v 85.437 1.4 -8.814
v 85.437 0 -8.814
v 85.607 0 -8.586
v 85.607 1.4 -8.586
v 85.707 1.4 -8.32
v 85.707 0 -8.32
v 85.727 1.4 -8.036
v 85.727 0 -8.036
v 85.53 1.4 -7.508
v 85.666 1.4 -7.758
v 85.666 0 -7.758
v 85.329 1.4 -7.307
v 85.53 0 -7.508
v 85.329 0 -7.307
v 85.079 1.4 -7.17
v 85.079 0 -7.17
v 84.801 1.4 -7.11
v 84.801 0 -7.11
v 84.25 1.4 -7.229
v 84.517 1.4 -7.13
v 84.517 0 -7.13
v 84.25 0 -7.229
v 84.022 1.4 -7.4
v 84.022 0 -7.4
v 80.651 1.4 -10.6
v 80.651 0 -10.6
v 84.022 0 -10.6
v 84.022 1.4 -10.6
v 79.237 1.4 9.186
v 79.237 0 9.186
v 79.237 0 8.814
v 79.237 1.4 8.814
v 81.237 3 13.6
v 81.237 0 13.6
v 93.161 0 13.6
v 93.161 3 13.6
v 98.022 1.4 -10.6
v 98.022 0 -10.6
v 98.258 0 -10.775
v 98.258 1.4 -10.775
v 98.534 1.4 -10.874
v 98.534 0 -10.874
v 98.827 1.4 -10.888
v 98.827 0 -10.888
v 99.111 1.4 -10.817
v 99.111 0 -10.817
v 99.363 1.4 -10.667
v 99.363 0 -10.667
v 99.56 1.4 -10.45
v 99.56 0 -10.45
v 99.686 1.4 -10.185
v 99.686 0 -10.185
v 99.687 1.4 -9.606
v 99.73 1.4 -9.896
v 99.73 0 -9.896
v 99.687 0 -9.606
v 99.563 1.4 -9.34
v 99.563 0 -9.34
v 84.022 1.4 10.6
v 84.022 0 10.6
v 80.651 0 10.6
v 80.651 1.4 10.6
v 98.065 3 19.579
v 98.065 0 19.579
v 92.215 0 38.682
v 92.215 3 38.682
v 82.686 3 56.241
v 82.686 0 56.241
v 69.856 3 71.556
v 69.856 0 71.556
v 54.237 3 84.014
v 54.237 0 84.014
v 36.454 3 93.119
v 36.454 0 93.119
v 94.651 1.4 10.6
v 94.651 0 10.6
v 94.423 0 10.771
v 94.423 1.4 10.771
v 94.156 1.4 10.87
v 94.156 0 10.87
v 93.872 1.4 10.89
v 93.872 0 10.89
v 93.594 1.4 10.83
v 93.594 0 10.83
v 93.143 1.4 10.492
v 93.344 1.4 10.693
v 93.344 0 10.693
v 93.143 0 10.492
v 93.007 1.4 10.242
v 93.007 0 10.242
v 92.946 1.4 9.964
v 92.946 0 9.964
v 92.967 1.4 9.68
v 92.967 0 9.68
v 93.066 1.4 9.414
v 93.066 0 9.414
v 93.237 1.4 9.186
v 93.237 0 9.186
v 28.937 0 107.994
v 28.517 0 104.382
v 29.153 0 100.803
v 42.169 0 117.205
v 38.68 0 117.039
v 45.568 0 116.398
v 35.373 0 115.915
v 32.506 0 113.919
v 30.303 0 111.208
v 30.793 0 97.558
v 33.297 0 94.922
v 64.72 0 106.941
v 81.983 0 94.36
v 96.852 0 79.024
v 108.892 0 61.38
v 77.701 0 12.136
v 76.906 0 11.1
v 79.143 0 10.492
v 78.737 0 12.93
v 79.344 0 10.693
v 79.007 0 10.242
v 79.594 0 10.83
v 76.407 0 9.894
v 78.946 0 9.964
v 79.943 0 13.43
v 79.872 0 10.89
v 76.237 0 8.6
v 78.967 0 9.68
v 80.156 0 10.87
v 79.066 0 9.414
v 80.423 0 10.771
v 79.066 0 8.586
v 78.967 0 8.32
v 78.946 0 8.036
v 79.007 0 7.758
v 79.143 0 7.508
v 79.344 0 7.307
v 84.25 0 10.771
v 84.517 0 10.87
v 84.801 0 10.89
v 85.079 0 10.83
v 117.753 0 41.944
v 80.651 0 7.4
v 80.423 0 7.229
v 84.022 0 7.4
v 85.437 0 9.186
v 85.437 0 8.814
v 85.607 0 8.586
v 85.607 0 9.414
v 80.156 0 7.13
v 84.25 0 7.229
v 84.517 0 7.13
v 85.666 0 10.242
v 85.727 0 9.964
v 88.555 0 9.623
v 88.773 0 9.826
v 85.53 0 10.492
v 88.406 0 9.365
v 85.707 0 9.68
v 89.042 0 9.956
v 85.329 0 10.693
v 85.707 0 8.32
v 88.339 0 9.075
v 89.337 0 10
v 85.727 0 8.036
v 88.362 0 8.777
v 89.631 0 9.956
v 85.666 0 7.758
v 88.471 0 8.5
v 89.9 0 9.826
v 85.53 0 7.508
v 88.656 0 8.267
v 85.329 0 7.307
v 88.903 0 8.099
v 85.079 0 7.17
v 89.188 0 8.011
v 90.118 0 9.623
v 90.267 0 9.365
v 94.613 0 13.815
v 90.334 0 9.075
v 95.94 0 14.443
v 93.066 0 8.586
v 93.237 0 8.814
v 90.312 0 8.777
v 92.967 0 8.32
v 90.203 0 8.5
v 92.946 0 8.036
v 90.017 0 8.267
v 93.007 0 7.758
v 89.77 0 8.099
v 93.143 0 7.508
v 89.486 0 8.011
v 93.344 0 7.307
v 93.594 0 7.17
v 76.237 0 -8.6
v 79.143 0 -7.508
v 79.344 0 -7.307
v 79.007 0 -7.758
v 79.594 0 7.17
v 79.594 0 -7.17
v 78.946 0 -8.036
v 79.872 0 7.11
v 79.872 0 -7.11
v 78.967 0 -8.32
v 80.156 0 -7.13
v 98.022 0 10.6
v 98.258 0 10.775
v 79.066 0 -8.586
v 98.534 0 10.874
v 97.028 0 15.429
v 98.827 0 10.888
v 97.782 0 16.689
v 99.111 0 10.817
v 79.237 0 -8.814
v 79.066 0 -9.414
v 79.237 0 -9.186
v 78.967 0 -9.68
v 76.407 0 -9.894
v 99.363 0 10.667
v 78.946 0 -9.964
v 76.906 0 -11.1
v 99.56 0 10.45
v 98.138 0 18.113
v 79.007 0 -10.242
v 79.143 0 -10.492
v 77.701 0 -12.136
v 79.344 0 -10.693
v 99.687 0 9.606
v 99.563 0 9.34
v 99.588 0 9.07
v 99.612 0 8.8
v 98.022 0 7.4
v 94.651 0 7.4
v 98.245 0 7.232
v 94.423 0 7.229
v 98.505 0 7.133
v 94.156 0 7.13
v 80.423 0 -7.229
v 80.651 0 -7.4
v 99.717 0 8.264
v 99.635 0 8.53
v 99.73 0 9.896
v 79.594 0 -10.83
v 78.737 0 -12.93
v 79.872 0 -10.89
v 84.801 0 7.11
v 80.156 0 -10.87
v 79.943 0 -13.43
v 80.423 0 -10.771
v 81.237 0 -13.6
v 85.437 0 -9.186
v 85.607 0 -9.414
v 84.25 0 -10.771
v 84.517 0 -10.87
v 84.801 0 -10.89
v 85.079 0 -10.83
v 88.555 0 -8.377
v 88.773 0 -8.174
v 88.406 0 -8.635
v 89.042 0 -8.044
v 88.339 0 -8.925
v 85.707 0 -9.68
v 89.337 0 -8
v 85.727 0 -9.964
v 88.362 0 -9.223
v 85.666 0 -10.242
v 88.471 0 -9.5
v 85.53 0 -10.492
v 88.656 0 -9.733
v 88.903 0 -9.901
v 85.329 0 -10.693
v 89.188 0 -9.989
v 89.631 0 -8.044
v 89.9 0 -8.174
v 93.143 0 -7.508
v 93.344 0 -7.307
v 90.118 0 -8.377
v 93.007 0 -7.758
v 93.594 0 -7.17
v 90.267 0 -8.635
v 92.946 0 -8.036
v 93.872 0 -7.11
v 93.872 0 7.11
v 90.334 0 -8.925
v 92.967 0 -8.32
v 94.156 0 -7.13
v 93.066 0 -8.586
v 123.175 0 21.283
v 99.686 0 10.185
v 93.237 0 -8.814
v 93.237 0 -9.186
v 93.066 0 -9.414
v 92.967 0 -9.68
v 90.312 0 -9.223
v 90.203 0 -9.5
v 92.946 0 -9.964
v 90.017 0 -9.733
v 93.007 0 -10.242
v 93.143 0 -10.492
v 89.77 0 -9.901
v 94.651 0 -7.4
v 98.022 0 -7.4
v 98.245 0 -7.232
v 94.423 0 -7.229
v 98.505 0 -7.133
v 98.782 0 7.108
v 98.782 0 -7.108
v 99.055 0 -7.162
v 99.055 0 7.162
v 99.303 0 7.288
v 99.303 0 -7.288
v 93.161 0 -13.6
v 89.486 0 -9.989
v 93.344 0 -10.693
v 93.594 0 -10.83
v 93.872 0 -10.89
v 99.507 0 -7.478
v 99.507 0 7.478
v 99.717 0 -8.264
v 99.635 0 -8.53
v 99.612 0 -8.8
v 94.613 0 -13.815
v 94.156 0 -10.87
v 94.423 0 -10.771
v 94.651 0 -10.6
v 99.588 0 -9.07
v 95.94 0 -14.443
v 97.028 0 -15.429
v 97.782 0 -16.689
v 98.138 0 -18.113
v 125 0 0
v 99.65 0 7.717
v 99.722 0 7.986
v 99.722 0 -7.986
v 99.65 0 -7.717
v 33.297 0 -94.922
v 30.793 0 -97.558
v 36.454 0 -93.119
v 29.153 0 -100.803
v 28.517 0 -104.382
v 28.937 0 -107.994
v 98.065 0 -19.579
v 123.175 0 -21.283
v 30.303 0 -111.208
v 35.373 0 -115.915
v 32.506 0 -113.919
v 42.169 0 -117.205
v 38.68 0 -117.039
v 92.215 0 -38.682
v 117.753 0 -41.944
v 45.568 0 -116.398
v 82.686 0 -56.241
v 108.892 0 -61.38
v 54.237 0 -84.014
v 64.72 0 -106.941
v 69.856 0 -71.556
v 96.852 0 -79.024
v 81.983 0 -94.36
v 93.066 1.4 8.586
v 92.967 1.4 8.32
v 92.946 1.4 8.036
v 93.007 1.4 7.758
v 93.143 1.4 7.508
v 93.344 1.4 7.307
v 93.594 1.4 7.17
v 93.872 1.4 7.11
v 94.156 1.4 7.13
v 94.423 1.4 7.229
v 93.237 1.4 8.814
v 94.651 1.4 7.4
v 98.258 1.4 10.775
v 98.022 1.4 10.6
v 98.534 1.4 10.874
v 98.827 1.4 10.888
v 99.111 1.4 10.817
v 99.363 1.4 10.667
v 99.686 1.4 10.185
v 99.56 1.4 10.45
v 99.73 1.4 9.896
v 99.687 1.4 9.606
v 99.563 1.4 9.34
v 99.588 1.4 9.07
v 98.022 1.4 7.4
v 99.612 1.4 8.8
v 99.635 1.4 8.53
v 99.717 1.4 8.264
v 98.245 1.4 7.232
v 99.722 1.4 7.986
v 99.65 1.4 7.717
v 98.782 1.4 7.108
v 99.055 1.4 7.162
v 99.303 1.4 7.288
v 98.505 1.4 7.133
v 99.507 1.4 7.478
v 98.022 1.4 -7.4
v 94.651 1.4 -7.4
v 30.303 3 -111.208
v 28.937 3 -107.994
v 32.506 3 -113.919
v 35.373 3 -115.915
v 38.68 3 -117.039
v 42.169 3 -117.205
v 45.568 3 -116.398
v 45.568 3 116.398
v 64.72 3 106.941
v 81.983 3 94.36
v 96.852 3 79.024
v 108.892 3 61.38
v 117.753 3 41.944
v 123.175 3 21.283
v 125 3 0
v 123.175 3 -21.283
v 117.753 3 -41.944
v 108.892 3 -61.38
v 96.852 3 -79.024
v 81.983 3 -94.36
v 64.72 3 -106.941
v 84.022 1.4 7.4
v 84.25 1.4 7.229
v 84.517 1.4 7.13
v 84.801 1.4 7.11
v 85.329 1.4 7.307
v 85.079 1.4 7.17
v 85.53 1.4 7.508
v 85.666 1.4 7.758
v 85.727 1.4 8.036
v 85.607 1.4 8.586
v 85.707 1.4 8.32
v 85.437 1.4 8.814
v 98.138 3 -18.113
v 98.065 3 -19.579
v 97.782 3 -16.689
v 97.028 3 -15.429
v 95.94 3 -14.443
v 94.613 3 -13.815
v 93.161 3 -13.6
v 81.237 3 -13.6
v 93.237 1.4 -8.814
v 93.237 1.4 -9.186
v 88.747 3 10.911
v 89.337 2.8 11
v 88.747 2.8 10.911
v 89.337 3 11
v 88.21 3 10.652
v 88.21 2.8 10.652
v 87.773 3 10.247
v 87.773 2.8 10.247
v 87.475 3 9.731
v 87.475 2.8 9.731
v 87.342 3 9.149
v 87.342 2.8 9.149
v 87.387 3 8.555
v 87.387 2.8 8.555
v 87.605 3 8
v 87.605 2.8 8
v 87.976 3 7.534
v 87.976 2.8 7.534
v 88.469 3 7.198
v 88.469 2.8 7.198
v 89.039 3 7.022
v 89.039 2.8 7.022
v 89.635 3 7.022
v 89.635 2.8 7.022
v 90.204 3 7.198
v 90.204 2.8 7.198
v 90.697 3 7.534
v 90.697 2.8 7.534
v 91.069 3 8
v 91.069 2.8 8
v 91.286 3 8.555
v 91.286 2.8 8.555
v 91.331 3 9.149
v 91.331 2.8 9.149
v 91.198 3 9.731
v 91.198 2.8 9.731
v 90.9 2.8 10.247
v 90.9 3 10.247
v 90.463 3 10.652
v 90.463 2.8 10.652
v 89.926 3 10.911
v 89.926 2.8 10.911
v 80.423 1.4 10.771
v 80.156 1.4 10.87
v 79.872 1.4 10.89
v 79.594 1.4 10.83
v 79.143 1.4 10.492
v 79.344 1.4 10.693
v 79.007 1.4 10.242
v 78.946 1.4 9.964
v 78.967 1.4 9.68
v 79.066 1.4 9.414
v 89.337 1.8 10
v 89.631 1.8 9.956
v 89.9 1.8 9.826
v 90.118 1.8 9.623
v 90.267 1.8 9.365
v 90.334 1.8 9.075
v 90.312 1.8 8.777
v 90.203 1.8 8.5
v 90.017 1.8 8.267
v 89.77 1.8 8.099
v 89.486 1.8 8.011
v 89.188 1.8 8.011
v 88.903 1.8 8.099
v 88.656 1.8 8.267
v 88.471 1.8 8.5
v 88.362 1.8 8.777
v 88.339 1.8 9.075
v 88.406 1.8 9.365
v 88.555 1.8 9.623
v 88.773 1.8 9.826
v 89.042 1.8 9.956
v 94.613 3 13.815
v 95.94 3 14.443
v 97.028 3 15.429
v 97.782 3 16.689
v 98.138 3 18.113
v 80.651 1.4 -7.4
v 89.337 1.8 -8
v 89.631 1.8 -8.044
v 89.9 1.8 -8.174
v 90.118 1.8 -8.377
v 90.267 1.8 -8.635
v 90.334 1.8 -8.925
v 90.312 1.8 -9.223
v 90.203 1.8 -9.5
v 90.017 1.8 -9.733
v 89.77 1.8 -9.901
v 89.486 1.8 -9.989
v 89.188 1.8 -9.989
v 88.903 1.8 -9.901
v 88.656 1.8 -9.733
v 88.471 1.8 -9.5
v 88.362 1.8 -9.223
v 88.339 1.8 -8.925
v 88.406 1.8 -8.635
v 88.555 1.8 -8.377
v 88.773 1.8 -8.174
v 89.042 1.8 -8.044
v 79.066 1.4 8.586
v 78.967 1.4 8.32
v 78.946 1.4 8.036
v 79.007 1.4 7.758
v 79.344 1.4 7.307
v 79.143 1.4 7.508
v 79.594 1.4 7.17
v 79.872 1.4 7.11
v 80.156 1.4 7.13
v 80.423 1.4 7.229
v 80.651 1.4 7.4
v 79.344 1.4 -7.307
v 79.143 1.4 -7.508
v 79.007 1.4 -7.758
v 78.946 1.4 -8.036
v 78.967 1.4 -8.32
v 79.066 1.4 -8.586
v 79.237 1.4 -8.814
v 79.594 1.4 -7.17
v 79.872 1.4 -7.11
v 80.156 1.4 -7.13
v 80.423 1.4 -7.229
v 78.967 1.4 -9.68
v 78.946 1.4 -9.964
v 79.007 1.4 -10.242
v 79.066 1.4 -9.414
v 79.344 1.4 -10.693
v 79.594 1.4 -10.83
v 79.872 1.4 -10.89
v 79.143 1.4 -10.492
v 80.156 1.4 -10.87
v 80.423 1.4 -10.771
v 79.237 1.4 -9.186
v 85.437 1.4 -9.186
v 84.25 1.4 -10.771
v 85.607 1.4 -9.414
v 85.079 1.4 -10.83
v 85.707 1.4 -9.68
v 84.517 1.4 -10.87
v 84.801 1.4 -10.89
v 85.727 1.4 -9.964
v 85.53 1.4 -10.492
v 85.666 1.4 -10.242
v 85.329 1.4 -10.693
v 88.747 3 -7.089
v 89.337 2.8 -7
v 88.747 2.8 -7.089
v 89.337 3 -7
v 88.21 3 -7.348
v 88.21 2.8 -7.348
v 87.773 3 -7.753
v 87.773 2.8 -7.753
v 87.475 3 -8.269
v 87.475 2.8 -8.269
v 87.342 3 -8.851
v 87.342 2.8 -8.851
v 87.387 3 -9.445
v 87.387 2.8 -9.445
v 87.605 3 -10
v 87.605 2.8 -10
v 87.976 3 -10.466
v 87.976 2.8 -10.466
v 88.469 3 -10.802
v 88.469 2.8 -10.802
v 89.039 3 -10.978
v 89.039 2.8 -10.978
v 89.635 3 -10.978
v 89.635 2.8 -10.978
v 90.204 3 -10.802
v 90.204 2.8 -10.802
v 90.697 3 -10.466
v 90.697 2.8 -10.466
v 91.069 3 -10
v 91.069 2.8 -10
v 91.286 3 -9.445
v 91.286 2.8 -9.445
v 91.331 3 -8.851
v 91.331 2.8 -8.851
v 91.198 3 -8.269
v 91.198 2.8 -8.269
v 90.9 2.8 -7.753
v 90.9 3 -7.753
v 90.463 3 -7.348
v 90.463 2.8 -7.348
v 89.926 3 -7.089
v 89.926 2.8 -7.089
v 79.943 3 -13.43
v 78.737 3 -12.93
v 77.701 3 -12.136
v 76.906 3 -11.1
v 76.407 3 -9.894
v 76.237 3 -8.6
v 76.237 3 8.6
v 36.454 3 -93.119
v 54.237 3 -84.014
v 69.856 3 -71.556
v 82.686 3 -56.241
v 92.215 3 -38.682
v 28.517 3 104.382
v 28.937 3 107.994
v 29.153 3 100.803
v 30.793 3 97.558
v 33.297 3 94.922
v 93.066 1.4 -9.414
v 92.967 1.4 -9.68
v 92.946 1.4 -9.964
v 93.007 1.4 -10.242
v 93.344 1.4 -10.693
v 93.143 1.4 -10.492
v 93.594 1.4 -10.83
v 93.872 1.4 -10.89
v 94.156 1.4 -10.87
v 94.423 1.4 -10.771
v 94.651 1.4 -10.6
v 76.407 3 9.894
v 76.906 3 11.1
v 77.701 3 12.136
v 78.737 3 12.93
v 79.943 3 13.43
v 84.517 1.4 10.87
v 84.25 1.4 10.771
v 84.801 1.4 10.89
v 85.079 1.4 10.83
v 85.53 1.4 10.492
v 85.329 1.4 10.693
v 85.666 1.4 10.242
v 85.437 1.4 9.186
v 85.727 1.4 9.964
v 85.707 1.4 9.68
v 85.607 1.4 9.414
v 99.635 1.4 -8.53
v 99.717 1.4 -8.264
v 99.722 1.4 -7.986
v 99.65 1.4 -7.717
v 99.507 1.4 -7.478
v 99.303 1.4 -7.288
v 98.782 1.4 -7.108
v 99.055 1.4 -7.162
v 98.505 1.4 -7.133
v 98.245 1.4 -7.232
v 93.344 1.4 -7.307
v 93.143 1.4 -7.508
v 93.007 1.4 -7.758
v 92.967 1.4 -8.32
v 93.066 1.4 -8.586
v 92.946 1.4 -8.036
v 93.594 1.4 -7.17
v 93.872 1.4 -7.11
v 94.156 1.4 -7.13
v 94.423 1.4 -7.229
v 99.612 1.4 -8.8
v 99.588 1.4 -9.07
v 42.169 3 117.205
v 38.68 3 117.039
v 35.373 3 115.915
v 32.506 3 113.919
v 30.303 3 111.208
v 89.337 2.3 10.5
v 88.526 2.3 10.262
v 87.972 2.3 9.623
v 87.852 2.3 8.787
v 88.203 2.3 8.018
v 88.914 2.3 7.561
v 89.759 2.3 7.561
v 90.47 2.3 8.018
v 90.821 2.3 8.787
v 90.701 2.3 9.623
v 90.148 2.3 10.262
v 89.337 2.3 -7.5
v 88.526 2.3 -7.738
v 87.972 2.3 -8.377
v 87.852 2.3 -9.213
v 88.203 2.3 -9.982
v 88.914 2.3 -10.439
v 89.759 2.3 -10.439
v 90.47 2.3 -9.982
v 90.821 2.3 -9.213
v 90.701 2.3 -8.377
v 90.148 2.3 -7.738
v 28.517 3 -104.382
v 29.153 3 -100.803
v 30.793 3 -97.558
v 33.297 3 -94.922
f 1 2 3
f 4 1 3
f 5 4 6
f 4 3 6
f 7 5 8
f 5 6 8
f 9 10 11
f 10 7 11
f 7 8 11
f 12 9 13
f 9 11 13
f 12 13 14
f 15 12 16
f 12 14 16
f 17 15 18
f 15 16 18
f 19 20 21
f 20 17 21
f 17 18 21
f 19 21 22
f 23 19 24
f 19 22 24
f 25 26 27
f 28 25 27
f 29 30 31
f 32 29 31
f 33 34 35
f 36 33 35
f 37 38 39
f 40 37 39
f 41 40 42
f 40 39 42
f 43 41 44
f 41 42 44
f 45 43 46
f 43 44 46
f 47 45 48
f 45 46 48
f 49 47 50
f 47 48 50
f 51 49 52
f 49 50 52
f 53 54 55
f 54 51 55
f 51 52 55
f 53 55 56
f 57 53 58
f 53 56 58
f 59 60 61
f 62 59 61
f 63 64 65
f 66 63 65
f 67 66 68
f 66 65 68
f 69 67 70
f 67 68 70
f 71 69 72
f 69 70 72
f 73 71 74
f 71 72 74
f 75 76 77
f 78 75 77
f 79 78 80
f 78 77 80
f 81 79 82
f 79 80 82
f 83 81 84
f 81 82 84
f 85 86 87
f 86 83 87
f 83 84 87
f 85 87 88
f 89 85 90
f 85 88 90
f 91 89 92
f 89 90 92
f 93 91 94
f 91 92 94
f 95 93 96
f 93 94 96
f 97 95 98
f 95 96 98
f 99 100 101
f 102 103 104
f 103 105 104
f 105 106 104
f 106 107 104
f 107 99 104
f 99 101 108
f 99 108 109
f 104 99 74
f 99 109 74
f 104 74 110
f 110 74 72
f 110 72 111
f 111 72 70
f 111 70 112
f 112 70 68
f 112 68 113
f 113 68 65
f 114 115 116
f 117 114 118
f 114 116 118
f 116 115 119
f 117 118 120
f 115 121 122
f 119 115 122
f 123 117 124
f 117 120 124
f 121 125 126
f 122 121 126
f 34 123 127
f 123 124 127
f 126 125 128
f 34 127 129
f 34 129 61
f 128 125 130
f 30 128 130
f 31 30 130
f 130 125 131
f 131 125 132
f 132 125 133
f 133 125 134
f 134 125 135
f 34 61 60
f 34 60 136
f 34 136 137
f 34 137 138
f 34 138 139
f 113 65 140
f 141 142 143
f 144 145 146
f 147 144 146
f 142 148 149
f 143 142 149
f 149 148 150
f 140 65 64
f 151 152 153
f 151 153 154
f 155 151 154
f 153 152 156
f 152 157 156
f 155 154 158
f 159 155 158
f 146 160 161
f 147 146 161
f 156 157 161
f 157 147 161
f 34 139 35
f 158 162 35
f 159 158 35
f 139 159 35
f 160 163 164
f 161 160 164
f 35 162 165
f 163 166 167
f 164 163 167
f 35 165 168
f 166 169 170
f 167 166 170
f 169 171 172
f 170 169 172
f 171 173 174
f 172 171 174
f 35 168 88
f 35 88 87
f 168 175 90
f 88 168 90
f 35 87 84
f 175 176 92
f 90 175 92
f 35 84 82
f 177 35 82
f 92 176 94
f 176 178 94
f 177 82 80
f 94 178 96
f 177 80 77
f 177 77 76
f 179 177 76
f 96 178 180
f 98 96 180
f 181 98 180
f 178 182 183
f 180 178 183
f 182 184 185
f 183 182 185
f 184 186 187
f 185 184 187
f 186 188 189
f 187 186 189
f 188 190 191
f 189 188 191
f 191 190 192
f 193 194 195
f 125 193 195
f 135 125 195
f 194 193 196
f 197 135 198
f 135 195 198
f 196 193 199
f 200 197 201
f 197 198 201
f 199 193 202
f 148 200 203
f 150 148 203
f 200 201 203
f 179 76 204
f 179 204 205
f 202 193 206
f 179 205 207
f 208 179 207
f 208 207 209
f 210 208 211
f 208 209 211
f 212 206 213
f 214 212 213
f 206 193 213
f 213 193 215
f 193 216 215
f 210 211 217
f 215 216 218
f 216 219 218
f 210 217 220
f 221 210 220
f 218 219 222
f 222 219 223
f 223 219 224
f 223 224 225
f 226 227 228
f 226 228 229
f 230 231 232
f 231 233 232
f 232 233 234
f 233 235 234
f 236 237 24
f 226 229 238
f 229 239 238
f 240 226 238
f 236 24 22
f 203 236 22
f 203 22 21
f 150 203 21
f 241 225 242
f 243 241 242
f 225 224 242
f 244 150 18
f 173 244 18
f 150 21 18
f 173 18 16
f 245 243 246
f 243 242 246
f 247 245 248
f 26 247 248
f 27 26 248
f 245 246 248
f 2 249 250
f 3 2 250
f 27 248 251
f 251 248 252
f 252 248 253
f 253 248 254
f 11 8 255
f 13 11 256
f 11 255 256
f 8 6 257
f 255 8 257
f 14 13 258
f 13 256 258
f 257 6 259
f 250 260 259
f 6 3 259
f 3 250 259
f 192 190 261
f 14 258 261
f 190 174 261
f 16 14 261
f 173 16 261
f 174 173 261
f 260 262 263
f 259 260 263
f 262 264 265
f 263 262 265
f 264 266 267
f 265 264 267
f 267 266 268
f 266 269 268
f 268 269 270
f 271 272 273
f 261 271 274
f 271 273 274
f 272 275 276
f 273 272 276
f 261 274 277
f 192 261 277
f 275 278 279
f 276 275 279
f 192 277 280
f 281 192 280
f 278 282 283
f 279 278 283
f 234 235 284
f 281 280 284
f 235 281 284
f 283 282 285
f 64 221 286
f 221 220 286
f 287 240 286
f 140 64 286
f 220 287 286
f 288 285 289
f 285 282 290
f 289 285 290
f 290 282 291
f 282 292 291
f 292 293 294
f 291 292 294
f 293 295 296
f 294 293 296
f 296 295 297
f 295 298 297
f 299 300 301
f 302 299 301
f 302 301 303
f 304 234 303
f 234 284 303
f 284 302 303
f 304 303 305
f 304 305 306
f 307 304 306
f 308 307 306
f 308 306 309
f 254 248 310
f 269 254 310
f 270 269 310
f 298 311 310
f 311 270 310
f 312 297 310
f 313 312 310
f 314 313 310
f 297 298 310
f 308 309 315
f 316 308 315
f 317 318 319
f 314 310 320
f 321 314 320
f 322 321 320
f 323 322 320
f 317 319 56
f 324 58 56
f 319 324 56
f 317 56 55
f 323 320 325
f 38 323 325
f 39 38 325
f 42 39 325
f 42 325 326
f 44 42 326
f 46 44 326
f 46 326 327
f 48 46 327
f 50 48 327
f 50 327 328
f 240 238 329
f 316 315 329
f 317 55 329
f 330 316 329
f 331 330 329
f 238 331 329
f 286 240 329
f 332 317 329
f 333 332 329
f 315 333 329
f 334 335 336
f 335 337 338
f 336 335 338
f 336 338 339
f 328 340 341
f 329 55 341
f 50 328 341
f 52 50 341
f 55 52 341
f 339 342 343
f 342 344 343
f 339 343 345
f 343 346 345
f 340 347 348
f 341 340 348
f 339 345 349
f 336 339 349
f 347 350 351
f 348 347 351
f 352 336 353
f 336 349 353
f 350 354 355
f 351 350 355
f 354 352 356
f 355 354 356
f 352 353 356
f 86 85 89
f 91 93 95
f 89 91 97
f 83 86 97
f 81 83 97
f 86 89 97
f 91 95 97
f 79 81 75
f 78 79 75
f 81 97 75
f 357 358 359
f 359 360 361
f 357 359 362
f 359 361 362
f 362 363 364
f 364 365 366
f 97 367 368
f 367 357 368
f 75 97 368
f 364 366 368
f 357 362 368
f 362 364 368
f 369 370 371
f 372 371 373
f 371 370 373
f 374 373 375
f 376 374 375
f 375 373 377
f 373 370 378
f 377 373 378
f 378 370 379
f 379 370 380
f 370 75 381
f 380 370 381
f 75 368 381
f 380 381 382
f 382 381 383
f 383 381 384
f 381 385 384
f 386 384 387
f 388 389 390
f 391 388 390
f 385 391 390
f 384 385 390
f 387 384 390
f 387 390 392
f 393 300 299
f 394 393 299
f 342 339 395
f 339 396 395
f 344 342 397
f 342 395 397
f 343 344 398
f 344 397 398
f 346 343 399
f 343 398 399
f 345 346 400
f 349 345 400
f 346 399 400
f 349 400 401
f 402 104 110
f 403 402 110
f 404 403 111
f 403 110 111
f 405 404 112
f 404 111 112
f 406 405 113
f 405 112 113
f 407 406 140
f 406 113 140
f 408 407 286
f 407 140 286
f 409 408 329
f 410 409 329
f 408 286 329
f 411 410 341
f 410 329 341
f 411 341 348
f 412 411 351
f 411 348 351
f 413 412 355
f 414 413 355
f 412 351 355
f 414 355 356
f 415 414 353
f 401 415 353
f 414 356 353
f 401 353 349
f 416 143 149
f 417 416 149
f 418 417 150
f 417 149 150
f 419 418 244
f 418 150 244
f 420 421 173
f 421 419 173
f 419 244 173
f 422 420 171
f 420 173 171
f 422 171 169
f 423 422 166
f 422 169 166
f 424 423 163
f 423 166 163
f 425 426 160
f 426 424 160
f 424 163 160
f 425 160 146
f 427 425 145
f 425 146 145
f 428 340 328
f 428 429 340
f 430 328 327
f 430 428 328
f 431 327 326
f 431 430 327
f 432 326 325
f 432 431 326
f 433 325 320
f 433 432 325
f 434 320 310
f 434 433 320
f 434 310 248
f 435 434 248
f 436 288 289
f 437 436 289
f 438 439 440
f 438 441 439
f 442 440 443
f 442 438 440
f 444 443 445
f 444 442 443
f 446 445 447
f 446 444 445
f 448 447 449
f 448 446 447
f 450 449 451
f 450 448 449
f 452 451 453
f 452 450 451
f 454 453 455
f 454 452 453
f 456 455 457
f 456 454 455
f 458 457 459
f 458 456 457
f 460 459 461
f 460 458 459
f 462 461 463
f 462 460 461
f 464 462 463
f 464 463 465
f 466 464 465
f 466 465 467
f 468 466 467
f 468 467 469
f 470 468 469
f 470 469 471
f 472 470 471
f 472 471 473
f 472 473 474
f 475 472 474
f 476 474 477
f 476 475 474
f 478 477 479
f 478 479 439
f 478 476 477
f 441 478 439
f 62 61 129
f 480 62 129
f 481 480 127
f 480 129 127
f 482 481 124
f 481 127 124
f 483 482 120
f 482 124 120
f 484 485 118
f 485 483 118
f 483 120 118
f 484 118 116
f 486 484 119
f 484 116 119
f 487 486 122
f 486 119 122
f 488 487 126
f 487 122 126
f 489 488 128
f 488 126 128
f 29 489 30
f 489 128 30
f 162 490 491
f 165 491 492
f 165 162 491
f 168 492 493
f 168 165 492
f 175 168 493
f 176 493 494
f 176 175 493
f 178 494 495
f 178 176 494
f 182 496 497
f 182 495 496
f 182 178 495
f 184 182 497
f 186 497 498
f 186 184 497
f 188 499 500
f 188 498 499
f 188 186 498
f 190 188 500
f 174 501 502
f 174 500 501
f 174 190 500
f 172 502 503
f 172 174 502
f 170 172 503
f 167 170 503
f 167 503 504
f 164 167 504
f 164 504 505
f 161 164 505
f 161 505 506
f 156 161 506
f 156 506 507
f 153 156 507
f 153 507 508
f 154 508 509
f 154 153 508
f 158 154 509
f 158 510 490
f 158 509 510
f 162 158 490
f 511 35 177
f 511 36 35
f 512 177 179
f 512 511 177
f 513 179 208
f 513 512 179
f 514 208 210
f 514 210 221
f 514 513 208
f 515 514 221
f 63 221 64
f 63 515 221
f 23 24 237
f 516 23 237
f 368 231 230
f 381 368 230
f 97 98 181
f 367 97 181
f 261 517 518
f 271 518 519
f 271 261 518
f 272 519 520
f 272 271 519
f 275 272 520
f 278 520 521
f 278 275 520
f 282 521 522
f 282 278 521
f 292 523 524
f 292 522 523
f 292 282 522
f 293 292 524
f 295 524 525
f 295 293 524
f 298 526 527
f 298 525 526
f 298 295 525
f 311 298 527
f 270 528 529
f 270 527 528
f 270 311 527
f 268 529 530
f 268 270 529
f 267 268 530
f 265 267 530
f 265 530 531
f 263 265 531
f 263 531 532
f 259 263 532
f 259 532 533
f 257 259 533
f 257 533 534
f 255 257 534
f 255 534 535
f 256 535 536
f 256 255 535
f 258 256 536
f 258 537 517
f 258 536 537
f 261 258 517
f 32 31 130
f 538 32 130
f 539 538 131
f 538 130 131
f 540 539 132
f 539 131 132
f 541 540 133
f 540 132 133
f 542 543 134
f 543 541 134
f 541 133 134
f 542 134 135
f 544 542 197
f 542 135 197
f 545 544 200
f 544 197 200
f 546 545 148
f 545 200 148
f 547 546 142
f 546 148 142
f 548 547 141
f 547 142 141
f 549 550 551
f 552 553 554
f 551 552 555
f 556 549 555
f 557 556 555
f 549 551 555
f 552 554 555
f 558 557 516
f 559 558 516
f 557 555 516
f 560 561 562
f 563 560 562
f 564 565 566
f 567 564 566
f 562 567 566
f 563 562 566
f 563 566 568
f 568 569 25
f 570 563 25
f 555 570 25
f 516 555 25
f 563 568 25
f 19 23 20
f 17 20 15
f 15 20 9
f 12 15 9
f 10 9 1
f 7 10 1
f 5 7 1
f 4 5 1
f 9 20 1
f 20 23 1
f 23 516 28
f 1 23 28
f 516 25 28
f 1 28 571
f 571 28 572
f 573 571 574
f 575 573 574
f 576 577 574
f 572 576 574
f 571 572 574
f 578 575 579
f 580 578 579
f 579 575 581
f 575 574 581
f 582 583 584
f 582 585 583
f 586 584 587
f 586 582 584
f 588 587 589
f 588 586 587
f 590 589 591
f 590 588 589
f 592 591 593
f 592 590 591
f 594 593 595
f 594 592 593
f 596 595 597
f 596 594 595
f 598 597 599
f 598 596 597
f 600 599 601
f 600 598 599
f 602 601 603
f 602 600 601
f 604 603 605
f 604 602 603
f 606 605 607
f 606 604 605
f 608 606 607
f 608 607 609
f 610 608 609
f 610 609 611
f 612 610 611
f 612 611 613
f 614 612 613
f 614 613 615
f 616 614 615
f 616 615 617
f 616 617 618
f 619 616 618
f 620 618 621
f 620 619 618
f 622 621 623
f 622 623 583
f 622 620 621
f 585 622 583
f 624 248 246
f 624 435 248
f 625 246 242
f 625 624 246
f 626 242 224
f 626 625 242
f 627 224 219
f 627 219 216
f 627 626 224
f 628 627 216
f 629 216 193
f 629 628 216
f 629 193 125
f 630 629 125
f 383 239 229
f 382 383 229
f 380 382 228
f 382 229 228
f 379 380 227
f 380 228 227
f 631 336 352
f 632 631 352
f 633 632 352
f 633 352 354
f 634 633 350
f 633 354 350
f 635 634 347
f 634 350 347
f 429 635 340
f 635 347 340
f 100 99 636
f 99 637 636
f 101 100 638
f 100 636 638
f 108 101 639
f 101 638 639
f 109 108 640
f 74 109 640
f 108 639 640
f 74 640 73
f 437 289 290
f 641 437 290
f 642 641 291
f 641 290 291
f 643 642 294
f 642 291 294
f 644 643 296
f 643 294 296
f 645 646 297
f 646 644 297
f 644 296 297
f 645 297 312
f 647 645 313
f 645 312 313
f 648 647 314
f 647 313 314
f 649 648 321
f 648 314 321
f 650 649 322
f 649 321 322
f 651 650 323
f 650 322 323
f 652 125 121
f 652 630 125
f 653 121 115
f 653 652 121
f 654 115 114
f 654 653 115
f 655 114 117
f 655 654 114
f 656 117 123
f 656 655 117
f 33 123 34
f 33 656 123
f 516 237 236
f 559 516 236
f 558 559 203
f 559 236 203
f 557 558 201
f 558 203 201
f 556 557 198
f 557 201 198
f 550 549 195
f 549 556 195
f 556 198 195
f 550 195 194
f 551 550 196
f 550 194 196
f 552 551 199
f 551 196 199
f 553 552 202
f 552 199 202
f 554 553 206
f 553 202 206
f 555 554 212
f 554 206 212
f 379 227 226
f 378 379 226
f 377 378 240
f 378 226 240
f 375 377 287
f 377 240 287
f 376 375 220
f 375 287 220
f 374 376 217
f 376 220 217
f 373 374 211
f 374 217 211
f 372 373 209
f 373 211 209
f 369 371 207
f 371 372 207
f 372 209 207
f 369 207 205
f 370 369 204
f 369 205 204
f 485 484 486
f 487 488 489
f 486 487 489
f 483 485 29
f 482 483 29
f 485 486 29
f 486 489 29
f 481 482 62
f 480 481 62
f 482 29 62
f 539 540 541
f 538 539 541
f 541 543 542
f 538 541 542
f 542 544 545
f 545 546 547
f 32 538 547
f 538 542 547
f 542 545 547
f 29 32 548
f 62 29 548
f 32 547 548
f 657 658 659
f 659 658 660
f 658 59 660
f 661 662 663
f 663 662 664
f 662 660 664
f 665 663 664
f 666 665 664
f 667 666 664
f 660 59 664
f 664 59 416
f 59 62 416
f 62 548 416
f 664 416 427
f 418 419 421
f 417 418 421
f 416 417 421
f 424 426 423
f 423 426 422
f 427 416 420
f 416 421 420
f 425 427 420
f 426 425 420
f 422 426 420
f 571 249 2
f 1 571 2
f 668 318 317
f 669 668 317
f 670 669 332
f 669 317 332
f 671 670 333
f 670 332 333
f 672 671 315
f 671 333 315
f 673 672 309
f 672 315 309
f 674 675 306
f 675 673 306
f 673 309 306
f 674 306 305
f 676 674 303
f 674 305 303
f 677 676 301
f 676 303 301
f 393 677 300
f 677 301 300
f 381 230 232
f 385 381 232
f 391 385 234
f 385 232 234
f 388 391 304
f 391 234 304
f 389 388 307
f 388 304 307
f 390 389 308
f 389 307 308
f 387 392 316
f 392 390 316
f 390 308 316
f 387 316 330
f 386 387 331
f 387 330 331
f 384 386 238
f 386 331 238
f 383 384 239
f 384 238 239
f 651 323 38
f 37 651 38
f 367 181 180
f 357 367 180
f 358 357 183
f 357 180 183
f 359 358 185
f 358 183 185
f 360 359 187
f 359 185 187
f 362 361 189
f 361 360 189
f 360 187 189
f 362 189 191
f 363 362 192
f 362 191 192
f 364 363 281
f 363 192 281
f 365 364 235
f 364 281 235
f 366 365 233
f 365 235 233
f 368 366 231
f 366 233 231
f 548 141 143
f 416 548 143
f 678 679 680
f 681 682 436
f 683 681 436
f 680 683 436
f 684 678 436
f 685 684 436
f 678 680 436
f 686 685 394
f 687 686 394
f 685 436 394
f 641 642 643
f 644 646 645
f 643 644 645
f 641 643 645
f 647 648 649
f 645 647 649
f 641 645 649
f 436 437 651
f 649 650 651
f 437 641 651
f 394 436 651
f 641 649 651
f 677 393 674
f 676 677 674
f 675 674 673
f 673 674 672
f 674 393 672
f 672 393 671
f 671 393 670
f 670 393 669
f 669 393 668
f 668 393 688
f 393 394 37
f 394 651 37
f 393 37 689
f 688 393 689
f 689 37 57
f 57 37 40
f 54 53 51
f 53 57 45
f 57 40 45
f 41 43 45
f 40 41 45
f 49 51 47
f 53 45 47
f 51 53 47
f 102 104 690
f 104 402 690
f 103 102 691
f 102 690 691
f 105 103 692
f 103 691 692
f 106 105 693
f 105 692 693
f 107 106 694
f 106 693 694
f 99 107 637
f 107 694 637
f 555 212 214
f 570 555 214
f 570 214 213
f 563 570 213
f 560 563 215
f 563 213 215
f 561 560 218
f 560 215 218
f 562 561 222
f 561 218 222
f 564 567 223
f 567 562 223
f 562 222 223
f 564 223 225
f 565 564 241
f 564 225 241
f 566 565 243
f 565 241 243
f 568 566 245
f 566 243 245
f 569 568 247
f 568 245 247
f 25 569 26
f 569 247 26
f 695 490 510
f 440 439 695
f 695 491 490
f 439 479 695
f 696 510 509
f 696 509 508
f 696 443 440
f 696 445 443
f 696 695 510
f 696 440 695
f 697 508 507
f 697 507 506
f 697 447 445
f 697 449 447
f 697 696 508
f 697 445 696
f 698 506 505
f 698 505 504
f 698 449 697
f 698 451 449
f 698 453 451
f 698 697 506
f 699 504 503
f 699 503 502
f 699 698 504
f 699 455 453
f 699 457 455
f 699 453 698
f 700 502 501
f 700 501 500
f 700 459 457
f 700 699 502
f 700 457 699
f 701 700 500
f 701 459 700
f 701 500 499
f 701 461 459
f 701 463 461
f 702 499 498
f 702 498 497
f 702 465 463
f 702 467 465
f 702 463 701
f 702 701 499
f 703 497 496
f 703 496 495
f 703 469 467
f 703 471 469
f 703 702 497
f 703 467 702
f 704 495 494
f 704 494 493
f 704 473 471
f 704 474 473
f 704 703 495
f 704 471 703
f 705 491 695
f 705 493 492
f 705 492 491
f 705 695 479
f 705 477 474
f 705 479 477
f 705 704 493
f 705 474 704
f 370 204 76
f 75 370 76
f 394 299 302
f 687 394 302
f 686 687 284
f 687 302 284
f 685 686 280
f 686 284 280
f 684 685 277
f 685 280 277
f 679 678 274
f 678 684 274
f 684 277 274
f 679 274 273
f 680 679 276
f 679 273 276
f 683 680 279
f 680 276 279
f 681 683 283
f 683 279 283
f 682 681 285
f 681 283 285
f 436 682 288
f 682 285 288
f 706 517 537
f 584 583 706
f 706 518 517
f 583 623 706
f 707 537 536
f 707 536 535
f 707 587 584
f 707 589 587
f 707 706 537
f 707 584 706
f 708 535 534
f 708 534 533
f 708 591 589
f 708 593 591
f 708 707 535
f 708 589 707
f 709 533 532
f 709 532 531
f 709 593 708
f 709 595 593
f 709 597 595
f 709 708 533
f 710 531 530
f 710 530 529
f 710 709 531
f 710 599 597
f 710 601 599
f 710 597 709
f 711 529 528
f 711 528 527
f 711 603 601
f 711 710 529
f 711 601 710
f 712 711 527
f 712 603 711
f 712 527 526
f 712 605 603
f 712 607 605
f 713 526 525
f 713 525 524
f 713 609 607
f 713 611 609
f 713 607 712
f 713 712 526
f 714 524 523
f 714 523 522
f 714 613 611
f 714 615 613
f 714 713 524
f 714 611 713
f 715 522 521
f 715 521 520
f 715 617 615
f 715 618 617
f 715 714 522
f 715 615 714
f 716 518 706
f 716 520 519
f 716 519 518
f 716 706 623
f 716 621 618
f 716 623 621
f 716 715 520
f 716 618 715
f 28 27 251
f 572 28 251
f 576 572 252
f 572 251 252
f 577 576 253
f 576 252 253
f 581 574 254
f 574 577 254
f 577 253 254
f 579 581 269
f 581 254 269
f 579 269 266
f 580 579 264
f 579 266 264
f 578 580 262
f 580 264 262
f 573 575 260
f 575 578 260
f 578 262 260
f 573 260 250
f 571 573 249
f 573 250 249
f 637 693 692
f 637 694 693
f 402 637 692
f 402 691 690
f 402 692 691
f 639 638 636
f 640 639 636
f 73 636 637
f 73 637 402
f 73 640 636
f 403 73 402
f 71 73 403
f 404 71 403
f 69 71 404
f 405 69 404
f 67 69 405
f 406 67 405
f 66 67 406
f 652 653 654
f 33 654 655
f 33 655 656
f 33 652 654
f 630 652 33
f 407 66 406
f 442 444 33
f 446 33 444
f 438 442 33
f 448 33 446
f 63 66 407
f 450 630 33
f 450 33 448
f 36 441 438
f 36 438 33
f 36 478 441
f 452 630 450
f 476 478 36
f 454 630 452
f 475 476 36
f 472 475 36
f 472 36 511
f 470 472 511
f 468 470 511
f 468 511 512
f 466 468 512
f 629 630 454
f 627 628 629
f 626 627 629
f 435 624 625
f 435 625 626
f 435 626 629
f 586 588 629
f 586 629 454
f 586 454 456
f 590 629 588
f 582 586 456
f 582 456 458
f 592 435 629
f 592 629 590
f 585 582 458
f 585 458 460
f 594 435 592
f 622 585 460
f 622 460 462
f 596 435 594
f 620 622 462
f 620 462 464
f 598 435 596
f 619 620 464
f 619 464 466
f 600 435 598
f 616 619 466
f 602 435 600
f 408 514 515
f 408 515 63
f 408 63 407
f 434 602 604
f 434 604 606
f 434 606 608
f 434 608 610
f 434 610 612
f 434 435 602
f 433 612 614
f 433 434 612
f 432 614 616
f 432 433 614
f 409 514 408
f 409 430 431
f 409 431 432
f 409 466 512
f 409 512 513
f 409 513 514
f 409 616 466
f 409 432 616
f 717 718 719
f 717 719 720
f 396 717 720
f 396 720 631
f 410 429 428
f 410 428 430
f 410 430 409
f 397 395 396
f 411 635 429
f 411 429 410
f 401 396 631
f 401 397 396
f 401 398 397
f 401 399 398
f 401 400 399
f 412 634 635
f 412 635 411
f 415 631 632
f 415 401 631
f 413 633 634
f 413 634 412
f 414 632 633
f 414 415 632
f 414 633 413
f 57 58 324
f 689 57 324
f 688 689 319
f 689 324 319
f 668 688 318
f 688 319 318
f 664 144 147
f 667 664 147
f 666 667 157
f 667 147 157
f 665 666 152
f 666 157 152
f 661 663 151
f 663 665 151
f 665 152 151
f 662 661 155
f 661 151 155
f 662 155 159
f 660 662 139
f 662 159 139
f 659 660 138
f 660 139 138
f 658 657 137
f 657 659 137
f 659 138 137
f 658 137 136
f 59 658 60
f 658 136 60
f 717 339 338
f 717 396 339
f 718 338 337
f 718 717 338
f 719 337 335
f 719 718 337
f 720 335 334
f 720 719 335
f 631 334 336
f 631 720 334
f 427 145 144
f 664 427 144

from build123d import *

# Parameters (mm, degrees)
SKETCH1_R                                      = 1
BOSS_EXTRUDE1_DEPTH                            = 3
FILLET1_R                                      = 12.5
BOSS_EXTRUDE2_START                            = -1.6
BOSS_EXTRUDE2_DEPTH                            = 1.6
CSK_FOR_M2_FLAT_HEAD_MACHINE_SCREW1_AT_2_COUNT = 2
CSK_FOR_M2_FLAT_HEAD_MACHINE_SCREW1_AT_2_PITCH = 18
FILLET2_R                                      = 5


with BuildPart() as part:
    # Sketch1 → Boss-Extrude1 (new body)
    with BuildSketch(Plane(origin=(0, 0, 0), x_dir=(1, 0, 0), z_dir=(0, 1, 0))):
        with BuildLine():
            Line((32.352380638, 120.740728286), (25.88190451, 96.592582629))
            ThreePointArc((25.88190451, 96.592582629), (75.00161341, 66.141953296), (99.070883715, 13.6))
            Line((99.070883715, 13.6), (76.236612975, 13.6))
            Line((76.236612975, 13.6), (76.236612975, -13.6))
            Line((76.236612975, -13.6), (99.070883715, -13.6))
            ThreePointArc((99.070883715, -13.6), (75.00161341, -66.141953296), (25.88190451, -96.592582629))
            Line((25.88190451, -96.592582629), (32.352380638, -120.740728286))
            ThreePointArc((32.352380638, -120.740728286), (125, 0), (32.352380638, 120.740728286))
        make_face()
        with BuildLine():
            ThreePointArc((80.650826538, 7.4), (79.236612975, 7.4), (79.236612975, 8.814213562))
            Line((79.236612975, 8.814213562), (79.236612975, 9.185786438))
            ThreePointArc((79.236612975, 9.185786438), (79.236612975, 10.6), (80.650826538, 10.6))
            Line((80.650826538, 10.6), (84.022399413, 10.6))
            ThreePointArc((84.022399413, 10.6), (85.436612975, 10.6), (85.436612975, 9.185786438))
            Line((85.436612975, 9.185786438), (85.436612975, 8.814213562))
            ThreePointArc((85.436612975, 8.814213562), (85.436612975, 7.4), (84.022399413, 7.4))
            Line((84.022399413, 7.4), (80.650826538, 7.4))
        make_face(mode=Mode.SUBTRACT)
        with Locations(Location((89.336612975, 9, 0), (0, 0, 270))):
            Circle(SKETCH1_R, mode=Mode.SUBTRACT)
        with BuildLine():
            ThreePointArc((93.236612975, 9.185786438), (93.236612975, 10.6), (94.650826538, 10.6))
            Line((94.650826538, 10.6), (98.022399413, 10.6))
            ThreePointArc((98.022399413, 10.6), (99.362589189, 10.666977143), (99.56285316, 9.340142972))
            ThreePointArc((99.56285316, 9.340142972), (99.599997793, 8.93534776), (99.635496648, 8.530404901))
            ThreePointArc((99.635496648, 8.530404901), (99.303389883, 7.288169964), (98.022399413, 7.4))
            Line((98.022399413, 7.4), (94.650826538, 7.4))
            ThreePointArc((94.650826538, 7.4), (93.236612975, 7.4), (93.236612975, 8.814213562))
            Line((93.236612975, 8.814213562), (93.236612975, 9.185786438))
        make_face(mode=Mode.SUBTRACT)
        with BuildLine():
            ThreePointArc((98.022399413, -7.4), (99.303389883, -7.288169964), (99.635496648, -8.530404901))
            ThreePointArc((99.635496648, -8.530404901), (99.599997793, -8.93534776), (99.56285316, -9.340142972))
            ThreePointArc((99.56285316, -9.340142972), (99.362589189, -10.666977143), (98.022399413, -10.6))
            Line((98.022399413, -10.6), (94.650826538, -10.6))
            ThreePointArc((94.650826538, -10.6), (93.236612975, -10.6), (93.236612975, -9.185786438))
            Line((93.236612975, -9.185786438), (93.236612975, -8.814213562))
            ThreePointArc((93.236612975, -8.814213562), (93.236612975, -7.4), (94.650826538, -7.4))
            Line((94.650826538, -7.4), (98.022399413, -7.4))
        make_face(mode=Mode.SUBTRACT)
        with Locations(Location((89.336612975, -9, 0), (0, 0, 270))):
            Circle(SKETCH1_R, mode=Mode.SUBTRACT)
        with BuildLine():
            ThreePointArc((85.436612975, -9.185786438), (85.436612975, -10.6), (84.022399413, -10.6))
            Line((84.022399413, -10.6), (80.650826538, -10.6))
            ThreePointArc((80.650826538, -10.6), (79.236612975, -10.6), (79.236612975, -9.185786438))
            Line((79.236612975, -9.185786438), (79.236612975, -8.814213562))
            ThreePointArc((79.236612975, -8.814213562), (79.236612975, -7.4), (80.650826538, -7.4))
            Line((80.650826538, -7.4), (84.022399413, -7.4))
            ThreePointArc((84.022399413, -7.4), (85.436612975, -7.4), (85.436612975, -8.814213562))
            Line((85.436612975, -8.814213562), (85.436612975, -9.185786438))
        make_face(mode=Mode.SUBTRACT)
    extrude(amount=BOSS_EXTRUDE1_DEPTH)

    # Fillet1
    fillet1_edges = [part.edges().sort_by_distance(p)[0] for p in [
        (32.352380638, 1.5, 120.740728286),
        (25.88190451, 1.5, 96.592582629),
        (32.352380638, 1.5, -120.740728286),
        (25.88190451, 1.5, -96.592582629),
    ]]
    fillet(fillet1_edges, radius=FILLET1_R - 0.0001)  # a hair under: the kernel refuses the full size

    # Sketch2 → Boss-Extrude2 (add)
    with BuildSketch(Plane(origin=(0, 3, 0), x_dir=(1, 0, 0), z_dir=(0, 1, 0)).offset(BOSS_EXTRUDE2_START)):
        with BuildLine():
            Line((80.650826538, 7.4), (84.022399413, 7.4))
            ThreePointArc((84.022399413, 7.4), (85.436612975, 7.4), (85.436612975, 8.814213562))
            Line((85.436612975, 8.814213562), (85.436612975, 9.185786438))
            ThreePointArc((85.436612975, 9.185786438), (85.436612975, 10.6), (84.022399413, 10.6))
            Line((84.022399413, 10.6), (80.650826538, 10.6))
            ThreePointArc((80.650826538, 10.6), (79.236612975, 10.6), (79.236612975, 9.185786438))
            Line((79.236612975, 9.185786438), (79.236612975, 8.814213562))
            ThreePointArc((79.236612975, 8.814213562), (79.236612975, 7.4), (80.650826538, 7.4))
        make_face()
        with BuildLine():
            Line((93.236612975, 9.185786438), (93.236612975, 8.814213562))
            ThreePointArc((93.236612975, 8.814213562), (93.236612975, 7.4), (94.650826538, 7.4))
            Line((94.650826538, 7.4), (98.022399413, 7.4))
            ThreePointArc((98.022399413, 7.4), (99.303389883, 7.288169964), (99.635496648, 8.530404901))
            ThreePointArc((99.635496648, 8.530404901), (99.599997793, 8.93534776), (99.56285316, 9.340142972))
            ThreePointArc((99.56285316, 9.340142972), (99.362589189, 10.666977143), (98.022399413, 10.6))
            Line((98.022399413, 10.6), (94.650826538, 10.6))
            ThreePointArc((94.650826538, 10.6), (93.236612975, 10.6), (93.236612975, 9.185786438))
        make_face()
        with BuildLine():
            Line((84.022399413, -7.4), (80.650826538, -7.4))
            ThreePointArc((80.650826538, -7.4), (79.236612975, -7.4), (79.236612975, -8.814213562))
            Line((79.236612975, -8.814213562), (79.236612975, -9.185786438))
            ThreePointArc((79.236612975, -9.185786438), (79.236612975, -10.6), (80.650826538, -10.6))
            Line((80.650826538, -10.6), (84.022399413, -10.6))
            ThreePointArc((84.022399413, -10.6), (85.436612975, -10.6), (85.436612975, -9.185786438))
            Line((85.436612975, -9.185786438), (85.436612975, -8.814213562))
            ThreePointArc((85.436612975, -8.814213562), (85.436612975, -7.4), (84.022399413, -7.4))
        make_face()
        with BuildLine():
            Line((93.236612975, -8.814213562), (93.236612975, -9.185786438))
            ThreePointArc((93.236612975, -9.185786438), (93.236612975, -10.6), (94.650826538, -10.6))
            Line((94.650826538, -10.6), (98.022399413, -10.6))
            ThreePointArc((98.022399413, -10.6), (99.362589189, -10.666977143), (99.56285316, -9.340142972))
            ThreePointArc((99.56285316, -9.340142972), (99.599997793, -8.93534776), (99.635496648, -8.530404901))
            ThreePointArc((99.635496648, -8.530404901), (99.303389883, -7.288169964), (98.022399413, -7.4))
            Line((98.022399413, -7.4), (94.650826538, -7.4))
            ThreePointArc((94.650826538, -7.4), (93.236612975, -7.4), (93.236612975, -8.814213562))
        make_face()
    extrude(amount=BOSS_EXTRUDE2_DEPTH)

    # Sketch4 → CSK for M2 Flat Head Machine Screw1 (revolve, cut)
    with BuildSketch(Plane(origin=(89.336612975, 3, -9), x_dir=(0, 0, 1), z_dir=(1, 0, 0))):
        Polygon((0, 0), (0, 3), (1, 3), (1, 1.2), (2, 0.2), (2, 0), align=None)
    csk_for_m2_flat_head_machine_screw1 = revolve(axis=Axis((89.336612975, 9.35, -9), (0, -1, 0)), mode=Mode.SUBTRACT)

    # CSK for M2 Flat Head Machine Screw1 at 2: CSK for M2 Flat Head Machine Screw1 ×2
    with Locations(*[(0, 0, i * CSK_FOR_M2_FLAT_HEAD_MACHINE_SCREW1_AT_2_PITCH) for i in range(1, CSK_FOR_M2_FLAT_HEAD_MACHINE_SCREW1_AT_2_COUNT)]):
        add(csk_for_m2_flat_head_machine_screw1, mode=Mode.SUBTRACT)

    # Fillet2
    fillet2_edges = [part.edges().sort_by_distance(p)[0] for p in [
        (99.070883715, 1.5, -13.6),
        (99.070883715, 1.5, 13.6),
        (76.236612975, 1.5, 13.6),
        (76.236612975, 1.5, -13.6),
    ]]
    fillet(fillet2_edges, radius=FILLET2_R)


solid = part.part
